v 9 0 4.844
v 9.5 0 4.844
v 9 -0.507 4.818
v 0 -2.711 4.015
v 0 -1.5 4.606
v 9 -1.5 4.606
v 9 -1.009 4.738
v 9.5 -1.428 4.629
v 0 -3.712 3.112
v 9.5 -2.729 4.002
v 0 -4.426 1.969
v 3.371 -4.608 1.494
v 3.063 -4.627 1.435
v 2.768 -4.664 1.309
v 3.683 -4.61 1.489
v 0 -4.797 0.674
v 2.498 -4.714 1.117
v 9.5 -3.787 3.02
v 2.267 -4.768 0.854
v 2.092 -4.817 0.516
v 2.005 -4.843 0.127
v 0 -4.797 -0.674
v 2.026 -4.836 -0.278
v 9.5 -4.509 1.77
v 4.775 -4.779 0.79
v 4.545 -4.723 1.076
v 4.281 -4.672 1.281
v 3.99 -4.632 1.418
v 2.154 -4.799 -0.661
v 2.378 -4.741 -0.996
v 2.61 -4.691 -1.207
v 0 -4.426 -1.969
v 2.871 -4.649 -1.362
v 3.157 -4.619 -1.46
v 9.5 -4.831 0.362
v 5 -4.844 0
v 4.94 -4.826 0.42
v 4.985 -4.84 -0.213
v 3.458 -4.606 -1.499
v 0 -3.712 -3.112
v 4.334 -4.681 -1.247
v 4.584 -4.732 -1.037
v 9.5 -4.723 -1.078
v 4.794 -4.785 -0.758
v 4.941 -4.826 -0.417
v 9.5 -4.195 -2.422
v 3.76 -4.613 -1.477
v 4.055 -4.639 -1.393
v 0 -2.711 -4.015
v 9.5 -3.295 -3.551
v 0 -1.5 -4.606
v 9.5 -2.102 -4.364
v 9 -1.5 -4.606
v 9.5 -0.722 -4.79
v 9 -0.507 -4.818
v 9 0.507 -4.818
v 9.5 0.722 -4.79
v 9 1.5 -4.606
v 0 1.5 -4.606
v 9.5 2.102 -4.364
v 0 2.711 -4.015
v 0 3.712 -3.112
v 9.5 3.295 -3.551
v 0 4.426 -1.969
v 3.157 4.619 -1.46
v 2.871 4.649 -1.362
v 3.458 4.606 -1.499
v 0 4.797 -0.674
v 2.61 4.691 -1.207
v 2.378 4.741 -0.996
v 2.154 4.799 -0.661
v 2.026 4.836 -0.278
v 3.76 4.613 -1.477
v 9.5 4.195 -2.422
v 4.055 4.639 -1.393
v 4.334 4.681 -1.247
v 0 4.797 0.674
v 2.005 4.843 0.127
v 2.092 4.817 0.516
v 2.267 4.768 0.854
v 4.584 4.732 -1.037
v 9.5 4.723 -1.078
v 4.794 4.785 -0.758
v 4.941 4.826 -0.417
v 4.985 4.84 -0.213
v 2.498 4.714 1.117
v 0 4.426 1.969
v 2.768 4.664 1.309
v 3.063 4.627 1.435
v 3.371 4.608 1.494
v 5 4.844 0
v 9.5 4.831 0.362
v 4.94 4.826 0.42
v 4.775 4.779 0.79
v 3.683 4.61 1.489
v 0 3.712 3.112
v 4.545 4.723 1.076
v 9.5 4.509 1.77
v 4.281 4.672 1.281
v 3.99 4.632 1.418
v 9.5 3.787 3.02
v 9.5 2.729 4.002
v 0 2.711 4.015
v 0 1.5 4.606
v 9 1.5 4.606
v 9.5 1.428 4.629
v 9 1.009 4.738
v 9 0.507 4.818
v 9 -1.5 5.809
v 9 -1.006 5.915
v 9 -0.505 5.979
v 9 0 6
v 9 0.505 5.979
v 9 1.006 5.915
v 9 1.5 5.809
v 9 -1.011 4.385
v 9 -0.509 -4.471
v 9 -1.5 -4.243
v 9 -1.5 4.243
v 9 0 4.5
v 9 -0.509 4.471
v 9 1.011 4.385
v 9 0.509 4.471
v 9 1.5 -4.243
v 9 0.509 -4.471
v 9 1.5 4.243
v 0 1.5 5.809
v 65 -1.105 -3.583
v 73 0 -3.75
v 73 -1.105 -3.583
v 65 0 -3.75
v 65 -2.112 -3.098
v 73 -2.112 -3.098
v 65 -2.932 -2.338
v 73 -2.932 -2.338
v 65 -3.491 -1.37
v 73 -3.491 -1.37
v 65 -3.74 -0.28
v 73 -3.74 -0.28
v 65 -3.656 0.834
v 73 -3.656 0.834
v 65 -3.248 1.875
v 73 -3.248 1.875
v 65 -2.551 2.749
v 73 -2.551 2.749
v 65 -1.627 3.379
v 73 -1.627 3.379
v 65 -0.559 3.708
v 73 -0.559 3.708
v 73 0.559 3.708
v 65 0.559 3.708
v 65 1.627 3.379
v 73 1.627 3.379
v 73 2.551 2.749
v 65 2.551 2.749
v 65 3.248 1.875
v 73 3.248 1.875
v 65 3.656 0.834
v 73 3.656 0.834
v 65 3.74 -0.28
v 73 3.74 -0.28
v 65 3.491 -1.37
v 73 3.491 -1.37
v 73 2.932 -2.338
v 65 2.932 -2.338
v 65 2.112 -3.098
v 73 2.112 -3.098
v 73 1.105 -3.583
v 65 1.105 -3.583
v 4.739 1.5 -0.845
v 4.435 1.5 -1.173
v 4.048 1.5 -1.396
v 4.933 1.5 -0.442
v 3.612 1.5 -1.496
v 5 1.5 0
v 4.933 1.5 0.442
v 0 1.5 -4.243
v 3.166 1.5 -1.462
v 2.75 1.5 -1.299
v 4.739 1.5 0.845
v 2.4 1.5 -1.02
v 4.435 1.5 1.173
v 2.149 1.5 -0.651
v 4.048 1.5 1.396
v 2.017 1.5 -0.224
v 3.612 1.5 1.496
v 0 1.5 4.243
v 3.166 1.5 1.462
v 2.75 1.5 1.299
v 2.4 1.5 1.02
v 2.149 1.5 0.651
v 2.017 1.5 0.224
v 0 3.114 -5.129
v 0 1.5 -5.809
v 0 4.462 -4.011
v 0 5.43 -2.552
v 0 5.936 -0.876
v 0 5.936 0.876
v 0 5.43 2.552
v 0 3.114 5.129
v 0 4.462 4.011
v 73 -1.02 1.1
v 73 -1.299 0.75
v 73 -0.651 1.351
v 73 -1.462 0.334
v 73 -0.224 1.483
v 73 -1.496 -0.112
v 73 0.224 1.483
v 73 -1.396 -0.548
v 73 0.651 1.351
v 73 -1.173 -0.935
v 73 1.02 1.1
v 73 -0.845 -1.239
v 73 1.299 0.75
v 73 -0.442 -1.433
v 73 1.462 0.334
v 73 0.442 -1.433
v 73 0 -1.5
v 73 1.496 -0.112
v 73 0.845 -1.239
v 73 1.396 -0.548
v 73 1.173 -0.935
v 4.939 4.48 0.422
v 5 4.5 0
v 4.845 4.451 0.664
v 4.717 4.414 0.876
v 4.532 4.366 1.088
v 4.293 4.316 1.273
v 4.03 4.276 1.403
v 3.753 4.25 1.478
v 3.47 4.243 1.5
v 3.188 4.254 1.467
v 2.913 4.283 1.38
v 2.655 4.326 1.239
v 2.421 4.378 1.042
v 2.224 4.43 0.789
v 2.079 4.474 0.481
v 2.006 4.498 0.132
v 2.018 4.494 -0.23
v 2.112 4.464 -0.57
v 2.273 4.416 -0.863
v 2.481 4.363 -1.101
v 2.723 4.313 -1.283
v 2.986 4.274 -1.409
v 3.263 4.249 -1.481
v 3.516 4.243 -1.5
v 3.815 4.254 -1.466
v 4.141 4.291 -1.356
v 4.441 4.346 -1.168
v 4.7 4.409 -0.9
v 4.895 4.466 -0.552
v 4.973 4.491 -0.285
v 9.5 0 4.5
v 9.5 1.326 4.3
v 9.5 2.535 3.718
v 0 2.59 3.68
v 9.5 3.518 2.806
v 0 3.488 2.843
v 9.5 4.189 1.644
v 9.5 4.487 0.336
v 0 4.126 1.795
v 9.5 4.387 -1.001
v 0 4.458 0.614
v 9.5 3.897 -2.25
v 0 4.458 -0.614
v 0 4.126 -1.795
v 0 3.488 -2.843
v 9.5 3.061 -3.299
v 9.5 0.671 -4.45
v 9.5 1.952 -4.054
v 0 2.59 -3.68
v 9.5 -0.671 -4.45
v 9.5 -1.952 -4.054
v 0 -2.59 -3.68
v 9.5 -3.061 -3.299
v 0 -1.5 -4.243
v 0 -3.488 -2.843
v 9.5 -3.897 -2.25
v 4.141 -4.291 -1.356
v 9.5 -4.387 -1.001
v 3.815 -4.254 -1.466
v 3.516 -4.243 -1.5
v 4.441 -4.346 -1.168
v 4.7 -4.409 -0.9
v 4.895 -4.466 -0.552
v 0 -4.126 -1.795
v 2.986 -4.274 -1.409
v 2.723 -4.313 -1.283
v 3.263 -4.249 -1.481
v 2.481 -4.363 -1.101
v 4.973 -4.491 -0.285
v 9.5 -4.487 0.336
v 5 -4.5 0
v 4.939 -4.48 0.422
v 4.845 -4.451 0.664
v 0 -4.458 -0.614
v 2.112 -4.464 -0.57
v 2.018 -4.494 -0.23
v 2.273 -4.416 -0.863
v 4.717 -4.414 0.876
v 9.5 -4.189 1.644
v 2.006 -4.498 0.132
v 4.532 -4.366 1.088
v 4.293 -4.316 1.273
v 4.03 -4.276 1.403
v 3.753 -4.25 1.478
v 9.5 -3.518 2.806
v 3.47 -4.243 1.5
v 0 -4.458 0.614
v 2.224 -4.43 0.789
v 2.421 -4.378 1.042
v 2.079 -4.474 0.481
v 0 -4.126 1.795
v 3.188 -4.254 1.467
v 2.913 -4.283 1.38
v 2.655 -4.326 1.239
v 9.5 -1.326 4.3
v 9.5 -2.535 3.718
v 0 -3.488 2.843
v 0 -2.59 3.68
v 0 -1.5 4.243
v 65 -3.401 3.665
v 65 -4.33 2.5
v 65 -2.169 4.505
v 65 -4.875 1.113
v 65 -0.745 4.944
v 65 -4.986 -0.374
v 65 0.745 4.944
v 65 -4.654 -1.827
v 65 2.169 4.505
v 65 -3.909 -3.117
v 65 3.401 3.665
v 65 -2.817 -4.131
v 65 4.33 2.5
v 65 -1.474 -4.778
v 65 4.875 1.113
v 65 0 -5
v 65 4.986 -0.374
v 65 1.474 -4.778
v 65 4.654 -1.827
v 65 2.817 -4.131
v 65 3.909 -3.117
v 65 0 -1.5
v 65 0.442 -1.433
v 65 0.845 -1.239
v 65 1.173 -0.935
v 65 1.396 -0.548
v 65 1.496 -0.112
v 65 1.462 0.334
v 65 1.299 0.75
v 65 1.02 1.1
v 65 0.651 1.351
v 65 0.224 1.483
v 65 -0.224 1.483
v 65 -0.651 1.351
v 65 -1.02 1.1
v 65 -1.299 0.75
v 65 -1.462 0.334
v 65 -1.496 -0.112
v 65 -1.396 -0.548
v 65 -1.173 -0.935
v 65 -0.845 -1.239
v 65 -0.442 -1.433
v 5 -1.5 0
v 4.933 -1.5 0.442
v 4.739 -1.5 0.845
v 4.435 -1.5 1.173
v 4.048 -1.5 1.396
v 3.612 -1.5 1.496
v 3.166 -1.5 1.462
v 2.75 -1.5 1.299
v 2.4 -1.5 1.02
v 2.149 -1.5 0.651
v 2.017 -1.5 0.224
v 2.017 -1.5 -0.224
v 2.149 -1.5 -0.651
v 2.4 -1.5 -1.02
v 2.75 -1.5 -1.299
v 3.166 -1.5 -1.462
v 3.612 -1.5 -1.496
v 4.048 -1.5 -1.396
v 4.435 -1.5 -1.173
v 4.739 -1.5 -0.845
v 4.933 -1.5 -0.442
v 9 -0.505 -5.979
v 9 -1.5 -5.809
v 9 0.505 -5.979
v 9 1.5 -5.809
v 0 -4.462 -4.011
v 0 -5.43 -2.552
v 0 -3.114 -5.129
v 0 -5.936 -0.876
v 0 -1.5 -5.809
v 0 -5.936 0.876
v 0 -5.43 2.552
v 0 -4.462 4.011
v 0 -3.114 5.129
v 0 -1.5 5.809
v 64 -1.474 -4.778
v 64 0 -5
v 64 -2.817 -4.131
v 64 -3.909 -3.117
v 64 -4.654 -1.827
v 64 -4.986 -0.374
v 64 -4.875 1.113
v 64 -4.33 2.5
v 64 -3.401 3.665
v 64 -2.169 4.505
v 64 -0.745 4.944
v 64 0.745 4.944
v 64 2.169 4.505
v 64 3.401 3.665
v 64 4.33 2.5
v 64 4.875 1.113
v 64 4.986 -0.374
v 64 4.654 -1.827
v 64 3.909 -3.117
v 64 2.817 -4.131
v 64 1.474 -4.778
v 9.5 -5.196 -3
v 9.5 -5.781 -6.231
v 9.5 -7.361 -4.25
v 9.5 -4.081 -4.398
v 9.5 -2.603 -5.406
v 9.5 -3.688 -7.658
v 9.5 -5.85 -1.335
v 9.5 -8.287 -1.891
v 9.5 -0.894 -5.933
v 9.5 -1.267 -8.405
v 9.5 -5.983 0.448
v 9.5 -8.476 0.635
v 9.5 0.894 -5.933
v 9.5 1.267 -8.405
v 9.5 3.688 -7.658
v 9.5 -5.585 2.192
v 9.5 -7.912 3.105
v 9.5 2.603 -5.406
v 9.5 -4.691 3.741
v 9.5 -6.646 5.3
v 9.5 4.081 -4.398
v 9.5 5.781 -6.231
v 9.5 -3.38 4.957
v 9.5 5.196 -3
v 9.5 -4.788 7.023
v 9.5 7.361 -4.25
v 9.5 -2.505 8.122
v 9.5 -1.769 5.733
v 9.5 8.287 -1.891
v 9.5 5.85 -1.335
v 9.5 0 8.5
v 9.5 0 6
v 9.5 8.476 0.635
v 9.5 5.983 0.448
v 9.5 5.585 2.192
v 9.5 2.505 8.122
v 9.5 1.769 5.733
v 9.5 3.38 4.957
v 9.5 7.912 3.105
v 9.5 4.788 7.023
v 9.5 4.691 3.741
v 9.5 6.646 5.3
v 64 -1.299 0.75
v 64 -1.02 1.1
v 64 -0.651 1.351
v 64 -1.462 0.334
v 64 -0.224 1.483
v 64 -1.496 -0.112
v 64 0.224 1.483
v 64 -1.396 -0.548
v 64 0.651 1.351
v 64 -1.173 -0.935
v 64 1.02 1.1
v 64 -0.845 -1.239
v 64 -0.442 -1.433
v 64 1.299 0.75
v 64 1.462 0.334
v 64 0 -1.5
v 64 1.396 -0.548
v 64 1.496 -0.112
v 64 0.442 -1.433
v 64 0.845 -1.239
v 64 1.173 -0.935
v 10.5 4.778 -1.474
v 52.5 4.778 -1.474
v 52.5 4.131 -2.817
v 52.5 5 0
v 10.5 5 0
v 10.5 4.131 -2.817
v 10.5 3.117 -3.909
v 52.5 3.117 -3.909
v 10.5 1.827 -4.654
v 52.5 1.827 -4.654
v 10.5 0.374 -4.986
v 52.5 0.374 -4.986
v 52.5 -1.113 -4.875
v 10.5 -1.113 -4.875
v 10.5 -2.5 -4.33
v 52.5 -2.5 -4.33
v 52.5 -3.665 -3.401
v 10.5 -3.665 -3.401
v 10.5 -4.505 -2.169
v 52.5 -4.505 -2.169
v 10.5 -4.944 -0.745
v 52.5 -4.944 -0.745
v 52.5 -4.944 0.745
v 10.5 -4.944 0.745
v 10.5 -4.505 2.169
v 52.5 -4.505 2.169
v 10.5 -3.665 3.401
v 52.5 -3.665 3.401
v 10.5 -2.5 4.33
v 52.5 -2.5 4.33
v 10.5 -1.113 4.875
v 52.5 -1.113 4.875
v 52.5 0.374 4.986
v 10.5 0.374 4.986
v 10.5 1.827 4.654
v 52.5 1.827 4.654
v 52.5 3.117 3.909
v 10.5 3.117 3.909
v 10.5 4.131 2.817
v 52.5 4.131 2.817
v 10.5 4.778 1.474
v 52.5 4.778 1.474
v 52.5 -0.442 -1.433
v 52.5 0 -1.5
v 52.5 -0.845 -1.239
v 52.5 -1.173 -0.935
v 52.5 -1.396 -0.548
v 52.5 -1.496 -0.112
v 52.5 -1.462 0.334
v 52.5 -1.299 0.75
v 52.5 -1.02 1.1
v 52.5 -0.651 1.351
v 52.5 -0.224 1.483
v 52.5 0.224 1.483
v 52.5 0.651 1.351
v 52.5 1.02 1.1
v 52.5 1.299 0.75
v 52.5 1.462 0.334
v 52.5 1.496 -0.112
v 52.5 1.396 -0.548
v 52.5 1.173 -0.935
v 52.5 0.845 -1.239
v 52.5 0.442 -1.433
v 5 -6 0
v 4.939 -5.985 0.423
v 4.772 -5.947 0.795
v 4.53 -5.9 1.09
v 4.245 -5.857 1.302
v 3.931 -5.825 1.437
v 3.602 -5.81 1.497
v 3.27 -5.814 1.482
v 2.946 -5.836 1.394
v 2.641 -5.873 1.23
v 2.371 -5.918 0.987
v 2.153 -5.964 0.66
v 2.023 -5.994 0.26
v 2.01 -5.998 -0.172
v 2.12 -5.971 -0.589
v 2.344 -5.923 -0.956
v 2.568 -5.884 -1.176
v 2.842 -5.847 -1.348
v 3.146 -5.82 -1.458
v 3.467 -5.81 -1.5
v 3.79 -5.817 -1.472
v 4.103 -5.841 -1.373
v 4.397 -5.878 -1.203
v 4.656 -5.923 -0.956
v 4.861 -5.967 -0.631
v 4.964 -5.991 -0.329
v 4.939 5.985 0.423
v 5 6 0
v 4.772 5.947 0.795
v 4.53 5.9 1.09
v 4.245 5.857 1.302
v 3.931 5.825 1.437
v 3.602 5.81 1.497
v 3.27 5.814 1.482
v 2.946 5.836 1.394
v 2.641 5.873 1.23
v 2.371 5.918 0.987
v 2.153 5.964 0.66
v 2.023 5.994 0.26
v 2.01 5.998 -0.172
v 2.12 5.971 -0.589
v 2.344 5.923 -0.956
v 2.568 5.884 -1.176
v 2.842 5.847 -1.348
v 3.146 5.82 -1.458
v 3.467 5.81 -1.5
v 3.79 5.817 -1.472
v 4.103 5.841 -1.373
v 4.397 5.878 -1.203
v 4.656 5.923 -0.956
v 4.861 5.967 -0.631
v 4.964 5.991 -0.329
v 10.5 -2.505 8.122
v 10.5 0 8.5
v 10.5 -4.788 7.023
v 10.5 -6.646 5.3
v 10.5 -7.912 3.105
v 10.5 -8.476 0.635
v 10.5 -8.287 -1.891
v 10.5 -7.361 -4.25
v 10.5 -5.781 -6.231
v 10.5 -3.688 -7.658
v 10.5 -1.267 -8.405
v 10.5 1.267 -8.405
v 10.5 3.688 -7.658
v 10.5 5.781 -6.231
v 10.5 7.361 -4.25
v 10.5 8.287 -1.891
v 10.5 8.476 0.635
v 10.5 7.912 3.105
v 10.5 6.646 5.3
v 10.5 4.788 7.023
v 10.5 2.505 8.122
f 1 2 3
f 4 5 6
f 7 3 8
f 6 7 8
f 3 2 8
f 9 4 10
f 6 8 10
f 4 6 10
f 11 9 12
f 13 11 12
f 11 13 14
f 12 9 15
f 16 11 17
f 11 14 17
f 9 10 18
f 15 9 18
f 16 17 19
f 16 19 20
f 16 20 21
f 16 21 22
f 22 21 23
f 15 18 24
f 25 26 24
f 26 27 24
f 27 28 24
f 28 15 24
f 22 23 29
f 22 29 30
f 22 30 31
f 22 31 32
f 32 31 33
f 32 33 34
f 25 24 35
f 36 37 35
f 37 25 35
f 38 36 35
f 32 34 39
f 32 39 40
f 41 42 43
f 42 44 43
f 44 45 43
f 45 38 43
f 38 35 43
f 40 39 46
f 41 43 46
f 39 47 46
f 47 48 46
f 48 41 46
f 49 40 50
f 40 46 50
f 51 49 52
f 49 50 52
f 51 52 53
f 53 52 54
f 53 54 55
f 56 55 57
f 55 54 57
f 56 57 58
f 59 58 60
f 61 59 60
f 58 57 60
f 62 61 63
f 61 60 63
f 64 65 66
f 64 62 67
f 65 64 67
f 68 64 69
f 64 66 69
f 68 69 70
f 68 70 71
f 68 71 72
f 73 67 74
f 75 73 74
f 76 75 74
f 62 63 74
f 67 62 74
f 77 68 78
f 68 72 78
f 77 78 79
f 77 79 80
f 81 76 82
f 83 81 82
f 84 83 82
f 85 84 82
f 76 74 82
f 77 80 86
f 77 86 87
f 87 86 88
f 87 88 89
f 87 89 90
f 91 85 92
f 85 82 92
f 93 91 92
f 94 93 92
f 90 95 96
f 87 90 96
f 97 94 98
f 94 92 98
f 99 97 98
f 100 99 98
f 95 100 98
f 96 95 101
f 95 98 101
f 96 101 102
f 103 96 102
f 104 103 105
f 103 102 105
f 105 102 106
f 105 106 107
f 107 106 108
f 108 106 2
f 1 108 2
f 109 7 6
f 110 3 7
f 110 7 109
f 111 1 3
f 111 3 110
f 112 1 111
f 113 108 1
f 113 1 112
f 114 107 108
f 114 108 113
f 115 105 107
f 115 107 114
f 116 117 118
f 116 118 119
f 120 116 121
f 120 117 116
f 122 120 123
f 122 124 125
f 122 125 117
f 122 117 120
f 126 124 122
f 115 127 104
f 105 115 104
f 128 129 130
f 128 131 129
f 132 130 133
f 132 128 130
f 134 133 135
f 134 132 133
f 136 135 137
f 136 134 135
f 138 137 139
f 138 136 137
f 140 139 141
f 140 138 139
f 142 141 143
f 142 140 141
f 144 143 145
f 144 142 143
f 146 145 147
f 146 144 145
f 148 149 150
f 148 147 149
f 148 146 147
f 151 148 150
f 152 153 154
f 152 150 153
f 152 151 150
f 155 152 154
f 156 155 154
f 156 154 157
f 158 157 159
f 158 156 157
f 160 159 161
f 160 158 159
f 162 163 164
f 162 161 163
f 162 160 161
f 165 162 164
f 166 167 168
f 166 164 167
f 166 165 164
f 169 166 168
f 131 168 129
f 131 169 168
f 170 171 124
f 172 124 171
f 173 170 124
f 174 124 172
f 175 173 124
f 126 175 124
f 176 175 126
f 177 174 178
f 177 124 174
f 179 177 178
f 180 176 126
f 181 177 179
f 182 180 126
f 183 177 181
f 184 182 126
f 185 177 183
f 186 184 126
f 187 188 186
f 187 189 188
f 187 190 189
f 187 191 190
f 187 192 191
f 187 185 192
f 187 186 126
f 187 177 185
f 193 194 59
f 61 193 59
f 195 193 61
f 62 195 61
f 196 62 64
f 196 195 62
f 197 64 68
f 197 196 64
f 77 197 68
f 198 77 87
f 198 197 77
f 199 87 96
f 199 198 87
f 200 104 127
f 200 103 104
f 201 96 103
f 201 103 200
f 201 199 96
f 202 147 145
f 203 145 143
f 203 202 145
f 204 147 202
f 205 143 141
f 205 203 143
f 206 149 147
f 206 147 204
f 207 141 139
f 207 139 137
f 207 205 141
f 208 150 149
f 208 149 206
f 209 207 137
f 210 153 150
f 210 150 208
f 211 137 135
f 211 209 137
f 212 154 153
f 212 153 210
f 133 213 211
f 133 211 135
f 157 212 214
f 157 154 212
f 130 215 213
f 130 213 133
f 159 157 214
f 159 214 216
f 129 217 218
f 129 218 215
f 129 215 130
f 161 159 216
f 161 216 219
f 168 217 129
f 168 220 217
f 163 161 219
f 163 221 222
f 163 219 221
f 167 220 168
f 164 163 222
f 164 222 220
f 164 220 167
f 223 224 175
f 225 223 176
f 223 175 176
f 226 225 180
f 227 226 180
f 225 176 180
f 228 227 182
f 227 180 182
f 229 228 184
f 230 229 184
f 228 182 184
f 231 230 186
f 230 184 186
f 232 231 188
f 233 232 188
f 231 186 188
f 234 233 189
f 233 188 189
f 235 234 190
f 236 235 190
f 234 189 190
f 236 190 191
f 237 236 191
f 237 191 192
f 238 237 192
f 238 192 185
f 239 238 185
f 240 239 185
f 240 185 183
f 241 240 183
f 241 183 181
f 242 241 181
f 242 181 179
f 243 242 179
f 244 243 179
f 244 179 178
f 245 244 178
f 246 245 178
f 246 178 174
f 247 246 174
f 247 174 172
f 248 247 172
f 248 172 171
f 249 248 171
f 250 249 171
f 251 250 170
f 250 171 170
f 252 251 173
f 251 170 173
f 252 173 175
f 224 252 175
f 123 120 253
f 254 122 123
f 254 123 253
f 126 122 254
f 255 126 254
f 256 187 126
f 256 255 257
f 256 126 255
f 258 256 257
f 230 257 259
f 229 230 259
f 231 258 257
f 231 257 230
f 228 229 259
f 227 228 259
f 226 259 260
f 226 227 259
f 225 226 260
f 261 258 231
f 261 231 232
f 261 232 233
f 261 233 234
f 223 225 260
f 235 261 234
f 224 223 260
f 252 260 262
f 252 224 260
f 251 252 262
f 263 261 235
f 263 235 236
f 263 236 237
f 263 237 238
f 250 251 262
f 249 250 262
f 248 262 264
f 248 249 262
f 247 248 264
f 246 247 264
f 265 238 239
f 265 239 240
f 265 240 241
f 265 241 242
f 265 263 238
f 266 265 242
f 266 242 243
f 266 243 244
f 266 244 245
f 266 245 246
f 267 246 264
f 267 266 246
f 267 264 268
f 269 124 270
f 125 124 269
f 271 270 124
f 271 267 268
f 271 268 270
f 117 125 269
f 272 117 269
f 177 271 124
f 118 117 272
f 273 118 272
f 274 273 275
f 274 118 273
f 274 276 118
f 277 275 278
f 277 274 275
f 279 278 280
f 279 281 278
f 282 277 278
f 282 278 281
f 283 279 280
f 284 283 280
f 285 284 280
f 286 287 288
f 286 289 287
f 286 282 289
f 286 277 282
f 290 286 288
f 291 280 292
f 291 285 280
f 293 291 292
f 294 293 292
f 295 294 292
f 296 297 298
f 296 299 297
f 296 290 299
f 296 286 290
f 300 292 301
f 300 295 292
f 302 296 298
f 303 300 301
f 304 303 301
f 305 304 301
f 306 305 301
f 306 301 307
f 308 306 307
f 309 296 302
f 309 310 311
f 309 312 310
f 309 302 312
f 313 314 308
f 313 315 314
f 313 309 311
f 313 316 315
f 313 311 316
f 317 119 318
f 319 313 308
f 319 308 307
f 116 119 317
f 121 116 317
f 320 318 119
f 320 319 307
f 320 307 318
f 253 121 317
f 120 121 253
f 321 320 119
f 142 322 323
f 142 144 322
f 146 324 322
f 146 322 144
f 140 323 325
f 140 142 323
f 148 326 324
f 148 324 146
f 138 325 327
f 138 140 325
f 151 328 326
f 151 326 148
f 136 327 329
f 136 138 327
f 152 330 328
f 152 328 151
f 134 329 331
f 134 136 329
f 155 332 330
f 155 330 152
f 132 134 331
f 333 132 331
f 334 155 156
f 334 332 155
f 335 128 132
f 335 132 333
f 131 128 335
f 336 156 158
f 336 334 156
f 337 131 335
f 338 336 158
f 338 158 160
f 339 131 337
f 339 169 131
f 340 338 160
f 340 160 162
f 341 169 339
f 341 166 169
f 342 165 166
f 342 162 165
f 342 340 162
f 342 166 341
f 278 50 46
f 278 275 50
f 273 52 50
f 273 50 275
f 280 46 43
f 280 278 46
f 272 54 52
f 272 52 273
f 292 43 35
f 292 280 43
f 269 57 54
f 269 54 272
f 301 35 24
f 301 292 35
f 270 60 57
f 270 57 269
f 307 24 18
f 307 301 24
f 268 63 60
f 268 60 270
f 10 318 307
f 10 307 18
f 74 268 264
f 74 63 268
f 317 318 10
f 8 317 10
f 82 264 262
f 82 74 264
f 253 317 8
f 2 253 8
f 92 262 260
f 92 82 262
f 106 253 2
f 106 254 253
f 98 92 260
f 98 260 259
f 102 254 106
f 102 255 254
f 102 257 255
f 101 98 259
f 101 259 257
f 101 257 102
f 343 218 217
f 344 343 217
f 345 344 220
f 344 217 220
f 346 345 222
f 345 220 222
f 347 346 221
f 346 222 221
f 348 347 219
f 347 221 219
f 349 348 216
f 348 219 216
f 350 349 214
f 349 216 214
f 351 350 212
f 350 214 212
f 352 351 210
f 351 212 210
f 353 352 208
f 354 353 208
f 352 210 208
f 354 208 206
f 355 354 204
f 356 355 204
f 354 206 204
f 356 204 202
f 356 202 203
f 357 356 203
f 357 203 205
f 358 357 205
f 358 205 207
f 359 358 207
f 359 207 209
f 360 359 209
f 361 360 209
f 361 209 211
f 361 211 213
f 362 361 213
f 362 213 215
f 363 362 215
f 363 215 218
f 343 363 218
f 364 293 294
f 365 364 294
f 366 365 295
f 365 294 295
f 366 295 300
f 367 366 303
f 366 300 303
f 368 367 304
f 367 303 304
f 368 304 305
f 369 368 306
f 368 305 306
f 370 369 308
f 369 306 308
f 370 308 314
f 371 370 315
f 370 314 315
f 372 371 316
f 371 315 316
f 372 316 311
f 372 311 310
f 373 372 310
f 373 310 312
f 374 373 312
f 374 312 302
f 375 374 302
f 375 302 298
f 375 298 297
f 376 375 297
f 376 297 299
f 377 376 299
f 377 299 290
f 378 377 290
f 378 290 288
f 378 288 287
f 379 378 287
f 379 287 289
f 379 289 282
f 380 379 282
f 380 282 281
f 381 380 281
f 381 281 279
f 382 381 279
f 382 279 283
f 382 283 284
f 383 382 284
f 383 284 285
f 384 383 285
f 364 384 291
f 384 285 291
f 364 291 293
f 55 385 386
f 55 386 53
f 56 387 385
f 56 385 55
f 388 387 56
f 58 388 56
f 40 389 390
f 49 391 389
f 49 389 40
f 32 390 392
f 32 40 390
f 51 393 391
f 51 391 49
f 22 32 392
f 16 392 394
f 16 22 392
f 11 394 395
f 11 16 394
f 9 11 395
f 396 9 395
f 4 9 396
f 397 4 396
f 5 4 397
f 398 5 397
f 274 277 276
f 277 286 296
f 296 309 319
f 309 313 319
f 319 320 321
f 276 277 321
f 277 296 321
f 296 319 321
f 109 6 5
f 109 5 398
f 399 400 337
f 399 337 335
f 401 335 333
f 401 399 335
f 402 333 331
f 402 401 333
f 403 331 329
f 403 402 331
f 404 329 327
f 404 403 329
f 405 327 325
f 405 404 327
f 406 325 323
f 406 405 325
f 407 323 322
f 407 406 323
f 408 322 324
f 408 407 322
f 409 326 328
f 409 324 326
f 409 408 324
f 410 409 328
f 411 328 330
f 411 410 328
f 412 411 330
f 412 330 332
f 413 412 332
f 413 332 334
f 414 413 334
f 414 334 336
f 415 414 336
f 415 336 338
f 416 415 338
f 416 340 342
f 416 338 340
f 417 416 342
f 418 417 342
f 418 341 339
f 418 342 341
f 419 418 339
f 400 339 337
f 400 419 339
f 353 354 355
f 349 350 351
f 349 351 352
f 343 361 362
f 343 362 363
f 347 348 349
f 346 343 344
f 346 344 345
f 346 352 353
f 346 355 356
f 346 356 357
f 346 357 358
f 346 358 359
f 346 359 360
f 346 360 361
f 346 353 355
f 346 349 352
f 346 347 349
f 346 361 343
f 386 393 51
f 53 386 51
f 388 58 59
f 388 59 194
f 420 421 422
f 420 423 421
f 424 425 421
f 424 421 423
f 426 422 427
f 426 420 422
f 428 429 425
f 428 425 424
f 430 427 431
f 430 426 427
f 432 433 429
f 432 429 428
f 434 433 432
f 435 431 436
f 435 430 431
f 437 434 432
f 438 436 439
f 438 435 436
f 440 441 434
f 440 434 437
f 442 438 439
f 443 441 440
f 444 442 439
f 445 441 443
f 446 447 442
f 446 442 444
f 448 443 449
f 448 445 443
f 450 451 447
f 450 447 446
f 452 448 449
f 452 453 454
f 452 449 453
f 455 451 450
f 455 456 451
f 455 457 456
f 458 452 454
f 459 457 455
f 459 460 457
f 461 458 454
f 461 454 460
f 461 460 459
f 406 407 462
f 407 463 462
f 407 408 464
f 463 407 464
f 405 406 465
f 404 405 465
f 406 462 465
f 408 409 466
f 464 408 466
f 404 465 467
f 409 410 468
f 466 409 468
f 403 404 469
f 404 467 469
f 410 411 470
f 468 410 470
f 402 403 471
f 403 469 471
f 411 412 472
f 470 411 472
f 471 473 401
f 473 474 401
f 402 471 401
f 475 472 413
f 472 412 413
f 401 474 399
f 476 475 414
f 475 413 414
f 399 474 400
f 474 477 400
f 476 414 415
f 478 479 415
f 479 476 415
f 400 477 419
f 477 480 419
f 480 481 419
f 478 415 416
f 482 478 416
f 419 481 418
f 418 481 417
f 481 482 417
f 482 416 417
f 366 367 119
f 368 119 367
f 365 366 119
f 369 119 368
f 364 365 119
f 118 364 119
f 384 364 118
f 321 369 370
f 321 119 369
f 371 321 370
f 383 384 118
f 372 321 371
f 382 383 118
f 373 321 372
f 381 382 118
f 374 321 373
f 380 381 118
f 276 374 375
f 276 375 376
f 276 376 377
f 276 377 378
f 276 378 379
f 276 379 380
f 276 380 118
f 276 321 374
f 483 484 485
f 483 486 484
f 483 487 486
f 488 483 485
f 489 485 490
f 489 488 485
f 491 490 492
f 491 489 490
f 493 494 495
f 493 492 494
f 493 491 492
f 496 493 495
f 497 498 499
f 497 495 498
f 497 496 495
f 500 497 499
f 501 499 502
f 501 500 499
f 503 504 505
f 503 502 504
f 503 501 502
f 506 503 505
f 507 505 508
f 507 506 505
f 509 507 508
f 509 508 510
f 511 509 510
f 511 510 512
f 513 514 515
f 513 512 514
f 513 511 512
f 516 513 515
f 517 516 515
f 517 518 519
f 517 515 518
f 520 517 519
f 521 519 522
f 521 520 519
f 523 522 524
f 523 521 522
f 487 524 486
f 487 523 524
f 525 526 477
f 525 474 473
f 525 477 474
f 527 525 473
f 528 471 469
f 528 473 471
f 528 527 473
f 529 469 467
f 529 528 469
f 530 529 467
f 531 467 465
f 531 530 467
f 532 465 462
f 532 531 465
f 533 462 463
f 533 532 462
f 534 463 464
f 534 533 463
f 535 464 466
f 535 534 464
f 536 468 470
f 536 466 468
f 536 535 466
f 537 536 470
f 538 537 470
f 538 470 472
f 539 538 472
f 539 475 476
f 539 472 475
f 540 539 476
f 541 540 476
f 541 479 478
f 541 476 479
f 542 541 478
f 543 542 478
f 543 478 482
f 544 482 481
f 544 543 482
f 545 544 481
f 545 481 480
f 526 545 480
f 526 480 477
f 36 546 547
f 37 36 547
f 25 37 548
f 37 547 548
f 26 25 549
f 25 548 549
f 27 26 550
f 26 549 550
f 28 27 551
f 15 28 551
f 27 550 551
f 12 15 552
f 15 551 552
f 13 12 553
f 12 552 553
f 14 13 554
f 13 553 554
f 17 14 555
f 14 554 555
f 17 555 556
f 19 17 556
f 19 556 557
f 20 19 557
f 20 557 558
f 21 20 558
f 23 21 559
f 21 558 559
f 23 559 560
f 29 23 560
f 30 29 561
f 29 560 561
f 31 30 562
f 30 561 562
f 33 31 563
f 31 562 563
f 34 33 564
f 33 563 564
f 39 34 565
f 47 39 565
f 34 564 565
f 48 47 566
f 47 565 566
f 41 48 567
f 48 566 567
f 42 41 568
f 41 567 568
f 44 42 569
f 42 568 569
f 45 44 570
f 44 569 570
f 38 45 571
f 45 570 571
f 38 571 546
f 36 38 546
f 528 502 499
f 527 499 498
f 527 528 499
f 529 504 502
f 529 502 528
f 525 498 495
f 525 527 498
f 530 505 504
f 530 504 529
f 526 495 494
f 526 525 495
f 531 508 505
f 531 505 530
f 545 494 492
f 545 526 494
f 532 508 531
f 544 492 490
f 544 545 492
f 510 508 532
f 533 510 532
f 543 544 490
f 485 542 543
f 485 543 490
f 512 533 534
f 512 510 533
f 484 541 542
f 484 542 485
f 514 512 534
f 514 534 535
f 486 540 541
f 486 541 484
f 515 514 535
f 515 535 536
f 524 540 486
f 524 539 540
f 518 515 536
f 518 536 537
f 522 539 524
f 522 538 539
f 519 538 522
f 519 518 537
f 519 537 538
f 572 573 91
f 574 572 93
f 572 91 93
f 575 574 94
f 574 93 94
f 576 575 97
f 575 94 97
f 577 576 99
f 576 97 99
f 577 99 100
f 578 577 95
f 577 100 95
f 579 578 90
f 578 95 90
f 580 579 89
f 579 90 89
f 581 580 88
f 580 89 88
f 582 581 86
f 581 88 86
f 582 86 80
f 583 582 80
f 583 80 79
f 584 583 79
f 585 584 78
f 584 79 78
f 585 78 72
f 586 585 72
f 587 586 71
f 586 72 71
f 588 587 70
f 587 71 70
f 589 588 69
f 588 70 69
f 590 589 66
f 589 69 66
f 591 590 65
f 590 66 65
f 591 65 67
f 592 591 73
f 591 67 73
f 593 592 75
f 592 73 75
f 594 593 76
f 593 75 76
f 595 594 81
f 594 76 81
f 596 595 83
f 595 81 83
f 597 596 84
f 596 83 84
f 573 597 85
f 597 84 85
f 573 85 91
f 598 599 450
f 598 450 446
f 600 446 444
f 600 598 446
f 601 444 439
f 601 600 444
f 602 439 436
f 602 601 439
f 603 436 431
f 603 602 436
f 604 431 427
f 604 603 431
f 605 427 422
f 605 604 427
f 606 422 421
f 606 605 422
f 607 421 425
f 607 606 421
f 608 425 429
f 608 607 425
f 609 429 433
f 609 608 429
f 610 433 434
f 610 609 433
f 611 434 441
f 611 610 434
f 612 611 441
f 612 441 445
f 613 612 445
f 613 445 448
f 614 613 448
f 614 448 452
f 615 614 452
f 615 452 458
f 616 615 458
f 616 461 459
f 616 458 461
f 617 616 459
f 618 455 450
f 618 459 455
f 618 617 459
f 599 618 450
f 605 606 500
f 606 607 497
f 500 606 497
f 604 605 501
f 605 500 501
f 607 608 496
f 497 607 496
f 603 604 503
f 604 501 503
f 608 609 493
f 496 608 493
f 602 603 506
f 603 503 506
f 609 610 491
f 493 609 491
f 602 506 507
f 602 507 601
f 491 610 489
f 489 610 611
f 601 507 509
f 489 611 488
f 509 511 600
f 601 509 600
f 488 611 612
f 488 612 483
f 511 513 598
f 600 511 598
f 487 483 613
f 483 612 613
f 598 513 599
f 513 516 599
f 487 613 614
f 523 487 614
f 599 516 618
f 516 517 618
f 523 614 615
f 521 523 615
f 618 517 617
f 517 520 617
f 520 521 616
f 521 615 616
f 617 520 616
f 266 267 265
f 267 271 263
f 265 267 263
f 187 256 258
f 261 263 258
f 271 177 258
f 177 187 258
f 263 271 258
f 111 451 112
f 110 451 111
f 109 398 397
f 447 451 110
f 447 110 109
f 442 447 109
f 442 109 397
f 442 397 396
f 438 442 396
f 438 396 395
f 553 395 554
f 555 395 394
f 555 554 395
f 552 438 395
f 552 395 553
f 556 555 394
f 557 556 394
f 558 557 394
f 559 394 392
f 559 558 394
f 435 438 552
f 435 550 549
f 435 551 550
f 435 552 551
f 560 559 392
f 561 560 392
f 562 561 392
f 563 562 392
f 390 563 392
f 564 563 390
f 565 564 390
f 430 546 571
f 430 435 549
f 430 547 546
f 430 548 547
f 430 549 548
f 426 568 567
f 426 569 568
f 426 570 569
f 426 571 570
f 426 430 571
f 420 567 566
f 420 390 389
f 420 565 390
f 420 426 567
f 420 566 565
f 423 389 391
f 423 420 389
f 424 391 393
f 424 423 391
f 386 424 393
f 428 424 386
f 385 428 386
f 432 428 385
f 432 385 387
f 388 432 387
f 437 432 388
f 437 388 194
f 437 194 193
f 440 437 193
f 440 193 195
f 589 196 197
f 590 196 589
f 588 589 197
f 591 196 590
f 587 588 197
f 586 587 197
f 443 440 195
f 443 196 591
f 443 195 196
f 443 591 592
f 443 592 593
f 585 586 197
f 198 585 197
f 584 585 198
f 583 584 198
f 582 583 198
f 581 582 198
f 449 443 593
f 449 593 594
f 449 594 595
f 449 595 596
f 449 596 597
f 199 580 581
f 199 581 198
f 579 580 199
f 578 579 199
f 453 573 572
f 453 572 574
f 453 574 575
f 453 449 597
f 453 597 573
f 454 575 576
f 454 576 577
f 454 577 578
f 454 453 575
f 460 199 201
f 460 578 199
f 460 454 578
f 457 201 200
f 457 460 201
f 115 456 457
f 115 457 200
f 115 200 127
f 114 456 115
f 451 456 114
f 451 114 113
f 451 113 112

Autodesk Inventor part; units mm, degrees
ref_plane "YZ Plane" through (0, 0, 0) normal (1, 0, 0) x (0, 1, 0)
ref_plane "XZ Plane" through (0, 0, 0) normal (0, 1, 0) x (-1, 0, 0)
ref_plane "XY Plane" through (0, 0, 0) normal (0, 0, 1) x (1, 0, 0)
sketch "Sketch1" plane through (0, 0, 0) normal (1, 0, 0) x (0, 1, 0)
  circle A0 centre (0, 0) radius 5
  dimension "d0" = 10
extrude "Extrusion1" add sketch "Sketch1" along normal blind 52.5
sketch "Sketch2" plane through (52.5, 0, 0) normal (1, 0, 0) x (0, 0, -1)
  circle A0 centre (0, 0) radius 1.5
  dimension "d3" = 3
extrude "Extrusion2" add sketch "Sketch2" along normal blind 11.5
sketch "Sketch3" plane through (64, 0, 0) normal (1, 0, 0) x (0, 0, -1)
  circle A0 centre (0, 0) radius 5
  dimension "d6" = 10
extrude "Extrusion3" add sketch "Sketch3" along normal blind 1
sketch "Sketch4" plane through (65, 0, 0) normal (1, 0, 0) x (0, 0, -1)
  circle A0 centre (0, 0) radius 3.75
  dimension "d9" = 7.5
extrude "Extrusion4" add sketch "Sketch4" along normal blind 8
sketch "Sketch5" plane through (73, 0, 0) normal (1, 0, 0) x (0, 0, -1)
  circle A0 centre (0, 0) radius 1.5
  dimension "d12" = 3
extrude "Extrusion5" cut sketch "Sketch5" against normal blind 8
sketch "Sketch6" plane through (0, 0, 0) normal (-1, 0, 0) x (0, 0, 1)
  circle A0 centre (0, 0) radius 3.75 projected
  circle A1 centre (0, 0) radius 4.5
  circle A2 centre (0, 0) radius 1.5 projected
  circle A3 centre (0, 0) radius 5
  dimension "d15" = 9
  dimension "d16" = 10
extrude "Extrusion6" cut sketch "Sketch6" against normal blind 10.5 contours A3
sketch "Sketch7" plane through (10.5, 0, 0) normal (-1, 0, 0) x (0, 0, 1)
  circle A0 centre (0, 0) radius 8.5
  dimension "d19" = 17
extrude "Extrusion7" add sketch "Sketch7" along normal blind 1
sketch "Sketch8" plane through (0, 0, 0) normal (-1, 0, 0) x (0, 0, 1)
  line L0 (-6, 1.5) -> (6, 1.5)
  line L1 (6, 1.5) -> (6, -1.5)
  line L2 (6, -1.5) -> (-6, -1.5)
  line L3 (-6, -1.5) -> (-6, 1.5)
  line L4 (-6, 1.5) -> (6, -1.5) construction
  line L5 (6, 1.5) -> (-6, -1.5) construction
  point P0 (0, 0)
  point P1 (0, 0)
  dimension "d23" = 12
extrude "Extrusion8" cut sketch "Sketch8" against normal blind 9
sketch "Sketch10" plane through (9.5, 0, 0) normal (-1, 0, 0) x (0, 0, 1)
  circle A0 centre (0, 0) radius 6
  circle A1 centre (0, 0) radius 1.5 projected
  circle A2 centre (0, 0) radius 4.8442
extrude "Extrusion10" add sketch "Sketch10" along normal blind 9.5 contours A0
sketch "Sketch12" plane through (0, 0, 0) normal (-1, 0, 0) x (0, 0, 1)
  line L0 (-8.4132, -1.5) -> (8.4132, -1.5)
  line L1 (8.4132, -1.5) -> (8.4132, 1.5)
  line L2 (8.4132, 1.5) -> (-8.4132, 1.5)
  line L3 (-8.4132, 1.5) -> (-8.4132, -1.5)
  line L4 (-8.4132, -1.5) -> (8.4132, 1.5) construction
  line L5 (8.4132, -1.5) -> (-8.4132, 1.5) construction
  point P0 (0, 0)
  dimension "d35" = 3
extrude "Extrusion12" cut sketch "Sketch12" against normal blind 9
sketch "Sketch13" plane through (0, 1.5, -5.8095) normal (0, -1, 0) x (1, 0, 0)
  line L0 (-3.5, 6.3202) -> (3.5, 6.3202)
  line L1 (3.5, 6.3202) -> (3.5, 5.2988)
  line L2 (3.5, 5.2988) -> (-3.5, 5.2988)
  line L3 (-3.5, 5.2988) -> (-3.5, 6.3202)
  line L4 (-3.5, 6.3202) -> (3.5, 5.2988) construction
  line L5 (3.5, 6.3202) -> (-3.5, 5.2988) construction
  circle A0 centre (3.5, 5.8095) radius 1.5
  point P0 (0, 5.8095)
  dimension "d38" = 7
  dimension "d39" = 3
extrude "Extrusion13" cut sketch "Sketch13" along normal through all both and the other way through all contours A0 L2 L1 L0 | L0 L1 L2 A0
properties part number "shaft"
